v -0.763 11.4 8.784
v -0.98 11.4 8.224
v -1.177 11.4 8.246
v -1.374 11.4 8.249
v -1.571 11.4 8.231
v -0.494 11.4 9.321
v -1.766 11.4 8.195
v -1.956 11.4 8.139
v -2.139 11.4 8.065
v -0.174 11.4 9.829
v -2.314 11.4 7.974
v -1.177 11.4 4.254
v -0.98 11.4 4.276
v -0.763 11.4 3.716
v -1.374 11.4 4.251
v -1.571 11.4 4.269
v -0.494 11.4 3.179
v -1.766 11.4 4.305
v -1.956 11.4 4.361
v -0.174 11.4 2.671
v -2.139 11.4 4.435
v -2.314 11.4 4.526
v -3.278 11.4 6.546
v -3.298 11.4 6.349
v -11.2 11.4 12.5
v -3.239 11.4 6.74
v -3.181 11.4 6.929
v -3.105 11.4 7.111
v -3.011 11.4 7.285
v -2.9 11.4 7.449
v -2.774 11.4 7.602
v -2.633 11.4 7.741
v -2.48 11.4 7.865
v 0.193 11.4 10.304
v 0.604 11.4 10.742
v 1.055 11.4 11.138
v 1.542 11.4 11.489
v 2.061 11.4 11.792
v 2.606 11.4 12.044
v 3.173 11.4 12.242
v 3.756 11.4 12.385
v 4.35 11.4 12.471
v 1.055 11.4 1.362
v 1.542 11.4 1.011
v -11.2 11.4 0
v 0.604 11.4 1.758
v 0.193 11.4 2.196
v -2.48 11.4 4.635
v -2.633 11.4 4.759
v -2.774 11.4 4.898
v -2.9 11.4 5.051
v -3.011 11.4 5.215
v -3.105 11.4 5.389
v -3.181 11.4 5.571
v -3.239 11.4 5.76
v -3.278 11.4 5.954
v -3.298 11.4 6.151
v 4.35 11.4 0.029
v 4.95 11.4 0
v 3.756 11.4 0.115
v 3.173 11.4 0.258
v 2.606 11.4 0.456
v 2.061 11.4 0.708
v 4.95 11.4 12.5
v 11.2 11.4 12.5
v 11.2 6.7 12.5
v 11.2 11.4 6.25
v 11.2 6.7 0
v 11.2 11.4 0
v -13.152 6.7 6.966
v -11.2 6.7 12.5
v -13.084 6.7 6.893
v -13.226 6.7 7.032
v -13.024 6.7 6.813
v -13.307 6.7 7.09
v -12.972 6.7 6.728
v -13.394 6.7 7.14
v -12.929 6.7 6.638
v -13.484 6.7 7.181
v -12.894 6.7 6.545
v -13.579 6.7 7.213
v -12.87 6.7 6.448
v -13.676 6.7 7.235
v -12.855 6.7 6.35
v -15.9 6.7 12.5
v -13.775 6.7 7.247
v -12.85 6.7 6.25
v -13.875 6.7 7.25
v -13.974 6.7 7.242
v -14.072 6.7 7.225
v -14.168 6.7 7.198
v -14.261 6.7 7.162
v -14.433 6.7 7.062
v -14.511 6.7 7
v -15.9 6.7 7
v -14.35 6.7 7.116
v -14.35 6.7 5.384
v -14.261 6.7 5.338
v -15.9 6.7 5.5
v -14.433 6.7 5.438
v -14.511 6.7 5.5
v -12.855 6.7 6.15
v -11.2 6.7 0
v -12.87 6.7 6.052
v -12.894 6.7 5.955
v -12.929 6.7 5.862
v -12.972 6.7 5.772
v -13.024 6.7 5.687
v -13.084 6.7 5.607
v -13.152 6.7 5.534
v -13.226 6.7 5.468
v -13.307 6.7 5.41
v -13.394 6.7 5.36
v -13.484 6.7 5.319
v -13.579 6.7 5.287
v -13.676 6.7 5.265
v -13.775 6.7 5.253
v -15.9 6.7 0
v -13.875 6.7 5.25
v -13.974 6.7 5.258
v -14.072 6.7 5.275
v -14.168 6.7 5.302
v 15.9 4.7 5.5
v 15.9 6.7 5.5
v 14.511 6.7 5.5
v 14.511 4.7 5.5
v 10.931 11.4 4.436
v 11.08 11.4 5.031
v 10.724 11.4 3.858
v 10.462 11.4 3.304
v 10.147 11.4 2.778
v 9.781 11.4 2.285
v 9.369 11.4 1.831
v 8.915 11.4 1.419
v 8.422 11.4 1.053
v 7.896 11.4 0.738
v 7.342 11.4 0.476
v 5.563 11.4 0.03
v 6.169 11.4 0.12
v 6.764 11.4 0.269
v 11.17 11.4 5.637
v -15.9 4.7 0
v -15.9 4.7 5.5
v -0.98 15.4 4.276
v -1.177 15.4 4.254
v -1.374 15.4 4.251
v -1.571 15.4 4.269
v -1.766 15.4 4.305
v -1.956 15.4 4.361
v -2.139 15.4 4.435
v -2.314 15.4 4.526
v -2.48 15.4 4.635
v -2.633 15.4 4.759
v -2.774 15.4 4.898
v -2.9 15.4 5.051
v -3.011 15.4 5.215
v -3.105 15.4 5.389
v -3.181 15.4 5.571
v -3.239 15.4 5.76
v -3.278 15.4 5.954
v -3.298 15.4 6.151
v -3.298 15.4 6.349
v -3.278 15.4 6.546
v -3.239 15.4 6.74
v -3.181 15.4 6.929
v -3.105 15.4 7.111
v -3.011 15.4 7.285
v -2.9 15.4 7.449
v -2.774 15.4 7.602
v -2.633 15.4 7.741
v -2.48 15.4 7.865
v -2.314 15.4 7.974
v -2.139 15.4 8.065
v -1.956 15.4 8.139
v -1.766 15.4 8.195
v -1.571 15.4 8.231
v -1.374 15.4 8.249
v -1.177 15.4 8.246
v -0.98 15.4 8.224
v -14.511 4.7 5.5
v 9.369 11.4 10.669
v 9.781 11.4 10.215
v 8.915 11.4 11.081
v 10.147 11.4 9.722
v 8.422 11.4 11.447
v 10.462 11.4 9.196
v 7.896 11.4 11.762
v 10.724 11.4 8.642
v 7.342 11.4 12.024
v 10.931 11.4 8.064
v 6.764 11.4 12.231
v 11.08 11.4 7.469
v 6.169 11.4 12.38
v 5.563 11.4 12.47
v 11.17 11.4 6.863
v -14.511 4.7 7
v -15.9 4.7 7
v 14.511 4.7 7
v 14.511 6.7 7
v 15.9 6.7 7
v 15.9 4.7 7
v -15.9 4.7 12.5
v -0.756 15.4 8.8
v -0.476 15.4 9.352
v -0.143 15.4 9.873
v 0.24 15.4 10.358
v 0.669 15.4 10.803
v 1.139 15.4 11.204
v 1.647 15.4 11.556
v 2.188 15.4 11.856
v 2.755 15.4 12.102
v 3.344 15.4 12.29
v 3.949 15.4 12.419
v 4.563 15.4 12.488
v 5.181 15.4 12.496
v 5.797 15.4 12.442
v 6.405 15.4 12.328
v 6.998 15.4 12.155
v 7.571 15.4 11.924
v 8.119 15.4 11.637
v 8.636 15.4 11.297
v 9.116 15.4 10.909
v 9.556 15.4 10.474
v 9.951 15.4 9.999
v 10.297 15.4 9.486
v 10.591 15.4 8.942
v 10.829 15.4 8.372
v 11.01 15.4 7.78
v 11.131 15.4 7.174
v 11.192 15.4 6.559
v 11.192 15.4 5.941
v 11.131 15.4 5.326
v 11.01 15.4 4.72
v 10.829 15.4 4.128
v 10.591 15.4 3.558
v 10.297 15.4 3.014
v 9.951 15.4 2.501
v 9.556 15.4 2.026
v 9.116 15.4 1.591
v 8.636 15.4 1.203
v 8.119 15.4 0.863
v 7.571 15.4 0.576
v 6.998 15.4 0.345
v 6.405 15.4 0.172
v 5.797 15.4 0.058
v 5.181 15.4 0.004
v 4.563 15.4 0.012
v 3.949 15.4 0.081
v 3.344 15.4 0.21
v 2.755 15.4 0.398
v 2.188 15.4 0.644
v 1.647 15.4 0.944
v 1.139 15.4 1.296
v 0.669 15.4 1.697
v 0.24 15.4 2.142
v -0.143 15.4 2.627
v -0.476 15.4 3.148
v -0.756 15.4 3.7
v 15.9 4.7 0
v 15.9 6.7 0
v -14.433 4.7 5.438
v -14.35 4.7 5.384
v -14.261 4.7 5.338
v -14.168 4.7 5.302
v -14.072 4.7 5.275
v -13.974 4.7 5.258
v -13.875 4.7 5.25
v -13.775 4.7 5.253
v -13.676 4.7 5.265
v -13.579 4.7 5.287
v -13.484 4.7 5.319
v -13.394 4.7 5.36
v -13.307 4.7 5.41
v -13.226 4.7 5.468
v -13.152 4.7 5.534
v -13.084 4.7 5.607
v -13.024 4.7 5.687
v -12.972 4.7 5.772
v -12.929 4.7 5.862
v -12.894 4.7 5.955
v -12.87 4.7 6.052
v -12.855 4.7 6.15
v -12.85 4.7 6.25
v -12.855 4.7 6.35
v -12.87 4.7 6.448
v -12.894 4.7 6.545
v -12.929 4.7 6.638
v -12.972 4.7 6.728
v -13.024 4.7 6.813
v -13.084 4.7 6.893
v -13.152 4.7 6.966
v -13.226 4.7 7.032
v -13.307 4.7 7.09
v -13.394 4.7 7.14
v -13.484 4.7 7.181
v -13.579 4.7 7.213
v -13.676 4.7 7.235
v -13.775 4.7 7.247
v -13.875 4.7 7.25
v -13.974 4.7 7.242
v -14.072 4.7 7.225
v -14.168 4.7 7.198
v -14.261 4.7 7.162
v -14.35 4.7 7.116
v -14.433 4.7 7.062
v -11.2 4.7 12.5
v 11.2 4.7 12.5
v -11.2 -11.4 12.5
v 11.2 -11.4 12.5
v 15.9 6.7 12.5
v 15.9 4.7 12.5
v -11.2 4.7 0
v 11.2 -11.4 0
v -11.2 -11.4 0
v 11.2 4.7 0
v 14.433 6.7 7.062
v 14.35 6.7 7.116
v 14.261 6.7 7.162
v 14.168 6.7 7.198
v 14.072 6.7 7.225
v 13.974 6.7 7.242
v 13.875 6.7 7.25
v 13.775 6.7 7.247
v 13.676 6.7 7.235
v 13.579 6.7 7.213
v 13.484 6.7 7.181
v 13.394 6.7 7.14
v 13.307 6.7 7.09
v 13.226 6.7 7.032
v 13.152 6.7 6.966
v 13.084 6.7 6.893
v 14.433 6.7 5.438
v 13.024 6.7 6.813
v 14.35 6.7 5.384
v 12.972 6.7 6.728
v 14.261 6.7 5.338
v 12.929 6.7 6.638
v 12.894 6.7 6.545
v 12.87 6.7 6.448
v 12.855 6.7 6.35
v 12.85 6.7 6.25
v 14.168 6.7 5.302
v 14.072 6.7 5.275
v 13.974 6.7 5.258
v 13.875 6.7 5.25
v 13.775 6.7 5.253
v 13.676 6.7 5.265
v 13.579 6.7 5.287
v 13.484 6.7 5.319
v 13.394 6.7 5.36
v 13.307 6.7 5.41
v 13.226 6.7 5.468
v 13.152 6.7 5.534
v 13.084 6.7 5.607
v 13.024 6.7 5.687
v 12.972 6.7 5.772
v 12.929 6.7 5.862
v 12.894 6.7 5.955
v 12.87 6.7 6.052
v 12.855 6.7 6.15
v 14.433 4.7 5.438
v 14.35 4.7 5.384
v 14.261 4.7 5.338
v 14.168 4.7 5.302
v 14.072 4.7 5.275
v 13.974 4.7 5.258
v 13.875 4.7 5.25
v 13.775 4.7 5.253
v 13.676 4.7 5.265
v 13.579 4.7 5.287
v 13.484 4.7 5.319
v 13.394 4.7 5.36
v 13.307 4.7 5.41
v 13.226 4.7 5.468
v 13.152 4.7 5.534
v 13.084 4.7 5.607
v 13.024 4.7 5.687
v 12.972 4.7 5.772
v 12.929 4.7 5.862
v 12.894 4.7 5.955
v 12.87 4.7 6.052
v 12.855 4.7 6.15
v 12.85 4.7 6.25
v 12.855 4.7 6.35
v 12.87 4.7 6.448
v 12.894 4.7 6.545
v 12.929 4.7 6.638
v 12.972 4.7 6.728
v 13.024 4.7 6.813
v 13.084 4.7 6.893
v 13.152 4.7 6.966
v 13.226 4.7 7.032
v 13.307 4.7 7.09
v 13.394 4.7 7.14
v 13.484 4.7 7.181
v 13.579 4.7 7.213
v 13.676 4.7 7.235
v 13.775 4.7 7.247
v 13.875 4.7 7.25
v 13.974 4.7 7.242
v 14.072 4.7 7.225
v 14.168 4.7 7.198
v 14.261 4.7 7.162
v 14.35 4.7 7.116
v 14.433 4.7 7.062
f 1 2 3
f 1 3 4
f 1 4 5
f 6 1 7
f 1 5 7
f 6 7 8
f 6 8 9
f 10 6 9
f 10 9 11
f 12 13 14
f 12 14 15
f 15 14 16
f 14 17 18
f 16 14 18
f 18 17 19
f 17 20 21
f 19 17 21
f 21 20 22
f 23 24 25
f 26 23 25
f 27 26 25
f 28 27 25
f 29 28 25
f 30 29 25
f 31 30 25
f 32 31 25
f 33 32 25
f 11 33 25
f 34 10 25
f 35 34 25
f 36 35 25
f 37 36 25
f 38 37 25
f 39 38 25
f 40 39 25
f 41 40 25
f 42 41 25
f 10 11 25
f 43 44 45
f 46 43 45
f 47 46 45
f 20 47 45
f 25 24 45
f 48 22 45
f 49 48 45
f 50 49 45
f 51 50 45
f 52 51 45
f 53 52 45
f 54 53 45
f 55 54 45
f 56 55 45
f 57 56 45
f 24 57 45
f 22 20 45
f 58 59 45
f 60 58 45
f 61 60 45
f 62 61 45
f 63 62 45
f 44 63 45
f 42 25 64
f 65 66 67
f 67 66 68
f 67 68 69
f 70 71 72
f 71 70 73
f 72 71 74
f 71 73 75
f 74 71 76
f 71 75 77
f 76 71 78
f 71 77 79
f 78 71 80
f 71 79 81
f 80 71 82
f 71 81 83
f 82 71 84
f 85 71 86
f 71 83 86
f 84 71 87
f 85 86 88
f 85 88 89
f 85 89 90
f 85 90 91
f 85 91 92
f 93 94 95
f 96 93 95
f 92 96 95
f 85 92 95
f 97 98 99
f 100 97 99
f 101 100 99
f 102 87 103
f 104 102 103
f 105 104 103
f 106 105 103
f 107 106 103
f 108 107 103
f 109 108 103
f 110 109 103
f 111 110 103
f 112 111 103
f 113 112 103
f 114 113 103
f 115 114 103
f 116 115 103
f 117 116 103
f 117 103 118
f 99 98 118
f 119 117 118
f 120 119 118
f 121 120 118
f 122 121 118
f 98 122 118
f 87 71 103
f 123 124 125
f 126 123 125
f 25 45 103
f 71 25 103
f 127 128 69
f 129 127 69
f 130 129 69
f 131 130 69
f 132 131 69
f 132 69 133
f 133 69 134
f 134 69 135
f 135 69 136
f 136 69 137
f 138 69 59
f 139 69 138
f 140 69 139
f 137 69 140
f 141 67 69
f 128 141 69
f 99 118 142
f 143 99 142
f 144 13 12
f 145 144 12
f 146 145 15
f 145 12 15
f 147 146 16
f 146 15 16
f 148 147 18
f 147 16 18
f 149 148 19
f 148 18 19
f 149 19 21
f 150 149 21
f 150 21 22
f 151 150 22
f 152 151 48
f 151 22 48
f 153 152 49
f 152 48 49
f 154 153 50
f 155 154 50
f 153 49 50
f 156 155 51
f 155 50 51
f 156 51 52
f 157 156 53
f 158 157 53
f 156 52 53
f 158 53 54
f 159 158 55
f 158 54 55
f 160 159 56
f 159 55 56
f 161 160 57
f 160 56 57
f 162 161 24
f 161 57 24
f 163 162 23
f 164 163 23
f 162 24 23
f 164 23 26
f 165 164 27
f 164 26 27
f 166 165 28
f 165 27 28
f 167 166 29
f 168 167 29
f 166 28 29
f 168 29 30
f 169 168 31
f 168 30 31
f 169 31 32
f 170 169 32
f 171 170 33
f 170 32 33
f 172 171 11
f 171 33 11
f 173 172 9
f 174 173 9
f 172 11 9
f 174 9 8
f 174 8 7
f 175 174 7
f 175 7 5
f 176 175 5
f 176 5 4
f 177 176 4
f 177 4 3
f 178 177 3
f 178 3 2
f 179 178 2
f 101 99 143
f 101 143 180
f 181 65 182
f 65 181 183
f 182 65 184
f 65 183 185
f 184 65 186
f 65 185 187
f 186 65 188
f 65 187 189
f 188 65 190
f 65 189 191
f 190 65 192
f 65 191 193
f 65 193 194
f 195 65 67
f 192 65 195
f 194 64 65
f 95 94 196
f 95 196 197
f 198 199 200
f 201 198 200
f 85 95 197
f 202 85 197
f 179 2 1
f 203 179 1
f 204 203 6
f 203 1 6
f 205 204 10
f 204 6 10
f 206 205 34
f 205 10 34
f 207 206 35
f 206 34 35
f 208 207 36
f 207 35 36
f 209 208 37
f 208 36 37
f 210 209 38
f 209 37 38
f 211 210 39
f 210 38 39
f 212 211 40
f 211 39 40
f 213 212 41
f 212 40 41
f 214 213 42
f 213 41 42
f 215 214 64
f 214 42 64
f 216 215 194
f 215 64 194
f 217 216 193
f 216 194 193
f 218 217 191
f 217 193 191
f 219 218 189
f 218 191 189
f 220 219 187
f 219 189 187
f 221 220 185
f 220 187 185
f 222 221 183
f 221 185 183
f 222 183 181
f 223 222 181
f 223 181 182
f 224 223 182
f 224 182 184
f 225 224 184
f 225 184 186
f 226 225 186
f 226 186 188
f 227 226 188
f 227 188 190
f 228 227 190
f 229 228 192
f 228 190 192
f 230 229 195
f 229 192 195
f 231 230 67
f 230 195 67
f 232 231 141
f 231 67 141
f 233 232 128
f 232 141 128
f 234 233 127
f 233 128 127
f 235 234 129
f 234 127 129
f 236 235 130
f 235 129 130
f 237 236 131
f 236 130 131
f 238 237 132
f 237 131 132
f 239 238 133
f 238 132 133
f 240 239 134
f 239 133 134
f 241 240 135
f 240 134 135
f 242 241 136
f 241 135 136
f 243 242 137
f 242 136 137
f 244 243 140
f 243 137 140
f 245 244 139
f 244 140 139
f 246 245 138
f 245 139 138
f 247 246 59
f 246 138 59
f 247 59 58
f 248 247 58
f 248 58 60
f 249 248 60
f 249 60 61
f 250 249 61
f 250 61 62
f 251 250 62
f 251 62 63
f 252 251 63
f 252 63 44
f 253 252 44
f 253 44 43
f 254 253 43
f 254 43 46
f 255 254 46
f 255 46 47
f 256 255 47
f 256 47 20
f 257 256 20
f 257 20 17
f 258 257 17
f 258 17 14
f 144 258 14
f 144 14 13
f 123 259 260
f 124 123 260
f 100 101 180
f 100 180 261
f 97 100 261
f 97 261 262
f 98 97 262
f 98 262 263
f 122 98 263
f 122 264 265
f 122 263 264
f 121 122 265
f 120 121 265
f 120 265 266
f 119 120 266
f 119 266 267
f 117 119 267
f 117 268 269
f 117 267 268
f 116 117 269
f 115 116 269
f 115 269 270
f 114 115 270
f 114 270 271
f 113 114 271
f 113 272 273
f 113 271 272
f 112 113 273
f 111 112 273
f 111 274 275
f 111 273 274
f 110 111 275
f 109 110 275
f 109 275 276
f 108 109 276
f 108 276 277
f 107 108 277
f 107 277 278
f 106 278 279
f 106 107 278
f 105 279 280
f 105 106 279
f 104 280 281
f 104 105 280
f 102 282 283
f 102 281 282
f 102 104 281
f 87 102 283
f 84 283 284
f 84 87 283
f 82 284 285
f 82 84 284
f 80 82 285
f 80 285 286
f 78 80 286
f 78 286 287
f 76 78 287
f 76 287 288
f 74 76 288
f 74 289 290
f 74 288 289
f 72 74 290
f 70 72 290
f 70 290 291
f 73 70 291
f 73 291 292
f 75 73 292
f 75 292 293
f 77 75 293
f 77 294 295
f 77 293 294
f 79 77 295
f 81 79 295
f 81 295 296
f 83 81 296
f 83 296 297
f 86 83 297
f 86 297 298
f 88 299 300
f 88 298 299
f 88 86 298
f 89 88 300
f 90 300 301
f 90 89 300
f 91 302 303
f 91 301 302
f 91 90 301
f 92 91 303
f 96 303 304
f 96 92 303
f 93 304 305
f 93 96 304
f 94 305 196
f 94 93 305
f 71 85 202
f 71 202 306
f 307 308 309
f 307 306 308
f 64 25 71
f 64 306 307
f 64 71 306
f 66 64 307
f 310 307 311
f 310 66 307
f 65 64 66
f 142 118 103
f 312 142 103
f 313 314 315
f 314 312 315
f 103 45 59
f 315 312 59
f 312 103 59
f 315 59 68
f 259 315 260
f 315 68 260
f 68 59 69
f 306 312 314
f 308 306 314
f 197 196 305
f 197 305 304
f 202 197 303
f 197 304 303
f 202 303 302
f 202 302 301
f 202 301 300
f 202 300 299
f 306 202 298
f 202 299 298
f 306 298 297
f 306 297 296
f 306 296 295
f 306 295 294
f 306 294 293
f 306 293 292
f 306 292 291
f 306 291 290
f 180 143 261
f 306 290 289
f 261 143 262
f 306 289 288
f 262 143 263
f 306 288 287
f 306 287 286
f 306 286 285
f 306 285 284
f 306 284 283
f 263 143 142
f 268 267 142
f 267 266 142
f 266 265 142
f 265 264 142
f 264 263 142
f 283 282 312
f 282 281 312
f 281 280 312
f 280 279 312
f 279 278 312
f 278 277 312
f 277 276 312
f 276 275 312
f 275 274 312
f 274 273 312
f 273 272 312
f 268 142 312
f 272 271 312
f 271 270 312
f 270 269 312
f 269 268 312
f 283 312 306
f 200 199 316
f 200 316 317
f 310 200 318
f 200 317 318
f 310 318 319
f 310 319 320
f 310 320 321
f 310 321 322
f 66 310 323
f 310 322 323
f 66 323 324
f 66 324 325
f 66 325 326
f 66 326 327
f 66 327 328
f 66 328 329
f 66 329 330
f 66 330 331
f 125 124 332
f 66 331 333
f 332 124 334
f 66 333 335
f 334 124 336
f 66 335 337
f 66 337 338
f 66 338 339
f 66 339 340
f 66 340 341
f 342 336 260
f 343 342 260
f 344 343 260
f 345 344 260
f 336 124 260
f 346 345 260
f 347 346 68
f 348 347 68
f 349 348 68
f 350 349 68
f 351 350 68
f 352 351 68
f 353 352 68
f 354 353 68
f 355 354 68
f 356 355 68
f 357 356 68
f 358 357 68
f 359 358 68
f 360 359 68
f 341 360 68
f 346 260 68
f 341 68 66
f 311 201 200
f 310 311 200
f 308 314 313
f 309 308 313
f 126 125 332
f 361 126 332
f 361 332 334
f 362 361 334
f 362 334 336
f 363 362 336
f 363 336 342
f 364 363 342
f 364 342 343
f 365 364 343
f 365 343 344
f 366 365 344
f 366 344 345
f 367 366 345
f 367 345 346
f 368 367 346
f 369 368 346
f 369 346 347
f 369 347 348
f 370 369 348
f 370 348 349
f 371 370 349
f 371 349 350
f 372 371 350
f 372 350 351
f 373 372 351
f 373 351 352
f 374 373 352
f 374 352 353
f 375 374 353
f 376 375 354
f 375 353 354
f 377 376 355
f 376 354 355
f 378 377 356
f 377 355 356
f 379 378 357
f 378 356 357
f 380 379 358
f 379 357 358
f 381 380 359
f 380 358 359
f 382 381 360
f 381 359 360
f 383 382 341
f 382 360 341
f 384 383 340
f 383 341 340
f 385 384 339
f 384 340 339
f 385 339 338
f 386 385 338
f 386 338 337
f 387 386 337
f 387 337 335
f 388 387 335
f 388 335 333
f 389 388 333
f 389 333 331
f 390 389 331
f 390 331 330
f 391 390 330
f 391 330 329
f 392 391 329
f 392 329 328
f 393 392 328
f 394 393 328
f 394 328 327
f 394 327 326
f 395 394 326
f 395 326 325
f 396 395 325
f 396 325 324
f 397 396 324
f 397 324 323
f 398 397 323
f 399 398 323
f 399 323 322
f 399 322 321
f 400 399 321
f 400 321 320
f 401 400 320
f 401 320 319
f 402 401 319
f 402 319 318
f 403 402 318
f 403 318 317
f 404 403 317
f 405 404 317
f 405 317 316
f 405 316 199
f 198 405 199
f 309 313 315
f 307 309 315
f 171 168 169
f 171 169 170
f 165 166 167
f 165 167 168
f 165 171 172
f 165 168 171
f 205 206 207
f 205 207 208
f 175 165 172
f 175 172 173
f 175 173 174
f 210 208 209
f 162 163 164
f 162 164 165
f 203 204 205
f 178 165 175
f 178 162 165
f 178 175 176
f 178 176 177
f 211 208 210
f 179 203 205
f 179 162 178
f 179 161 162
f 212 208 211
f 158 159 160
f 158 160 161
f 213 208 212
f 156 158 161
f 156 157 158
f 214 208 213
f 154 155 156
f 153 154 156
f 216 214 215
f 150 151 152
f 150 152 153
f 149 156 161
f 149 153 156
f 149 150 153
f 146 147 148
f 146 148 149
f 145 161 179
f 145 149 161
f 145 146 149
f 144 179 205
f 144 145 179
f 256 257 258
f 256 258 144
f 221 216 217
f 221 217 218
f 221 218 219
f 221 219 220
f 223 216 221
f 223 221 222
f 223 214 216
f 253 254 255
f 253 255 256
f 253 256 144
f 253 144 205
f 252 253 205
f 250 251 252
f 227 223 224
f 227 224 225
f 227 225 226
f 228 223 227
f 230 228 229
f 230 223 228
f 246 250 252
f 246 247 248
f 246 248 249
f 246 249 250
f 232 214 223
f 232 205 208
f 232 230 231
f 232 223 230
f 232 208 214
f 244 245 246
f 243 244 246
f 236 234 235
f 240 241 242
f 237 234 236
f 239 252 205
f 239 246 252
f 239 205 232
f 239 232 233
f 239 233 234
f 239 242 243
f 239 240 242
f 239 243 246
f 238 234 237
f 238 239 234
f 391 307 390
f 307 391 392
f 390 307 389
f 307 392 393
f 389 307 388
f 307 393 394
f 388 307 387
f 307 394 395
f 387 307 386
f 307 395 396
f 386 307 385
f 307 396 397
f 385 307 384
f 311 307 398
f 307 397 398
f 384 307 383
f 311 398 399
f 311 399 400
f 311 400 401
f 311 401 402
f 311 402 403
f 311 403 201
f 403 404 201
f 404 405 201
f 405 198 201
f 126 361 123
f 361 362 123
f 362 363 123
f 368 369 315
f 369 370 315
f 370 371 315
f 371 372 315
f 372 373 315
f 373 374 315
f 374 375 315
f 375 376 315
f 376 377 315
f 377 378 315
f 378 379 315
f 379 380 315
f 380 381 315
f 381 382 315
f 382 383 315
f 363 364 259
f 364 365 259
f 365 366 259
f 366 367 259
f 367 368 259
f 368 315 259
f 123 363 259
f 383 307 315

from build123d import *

# Parameters (mm, degrees)
RESSALTO_EXTRUS_O1_DEPTH = 12.5
ESBO_O2_R                = 1
CORTE_EXTRUS_O1_DEPTH    = 12.5
RESSALTO_EXTRUS_O2_DEPTH = 4


with BuildPart() as part:
    # Esboço1 → Ressalto-extrusão1 (new body)
    with BuildSketch(Plane.XY):
        Polygon((-11.2, -11.4), (11.2, -11.4), (11.2, 4.7), (15.9, 4.7), (15.9, 6.7), (11.2, 6.7), (11.2, 11.4), (-11.2, 11.4), (-11.2, 6.7), (-15.9, 6.7), (-15.9, 4.7), (-11.2, 4.7), align=None)
    extrude(amount=RESSALTO_EXTRUS_O1_DEPTH)

    # Esboço2 → Corte-extrusão1 (cut)
    with BuildSketch(Plane(origin=(0, 11.4, 0), x_dir=(1, 0, 0), z_dir=(0, 1, 0))):
        with BuildLine():
            Line((-14.511437828, -7), (-15.9, -7))
            Line((-15.9, -7), (-15.9, -5.5))
            Line((-15.9, -5.5), (-14.511437828, -5.5))
            ThreePointArc((-14.511437828, -5.5), (-12.85, -6.25), (-14.511437828, -7))
        make_face()
        with Locations((13.85, -6.25)):
            Circle(ESBO_O2_R)
        with BuildLine():
            ThreePointArc((14.85, -6.25), (14.761437828, -6.661437828), (14.511437828, -7))
            Line((14.511437828, -7), (15.9, -7))
            Line((15.9, -7), (15.9, -5.5))
            Line((15.9, -5.5), (14.511437828, -5.5))
            ThreePointArc((14.511437828, -5.5), (14.761437828, -5.838562172), (14.85, -6.25))
        make_face()
    extrude(amount=-CORTE_EXTRUS_O1_DEPTH, mode=Mode.SUBTRACT)

    # Esboço3 → Ressalto-extrusão2 (add)
    with BuildSketch(Plane(origin=(0, 11.4, 0), x_dir=(1, 0, 0), z_dir=(0, 1, 0))):
        with BuildLine():
            ThreePointArc((-0.98, -8.224234029), (11.2, -6.25), (-0.98, -4.275765971))
            ThreePointArc((-0.98, -4.275765971), (-3.3, -6.25), (-0.98, -8.224234029))
        make_face()
    extrude(amount=RESSALTO_EXTRUS_O2_DEPTH)


solid = part.part
